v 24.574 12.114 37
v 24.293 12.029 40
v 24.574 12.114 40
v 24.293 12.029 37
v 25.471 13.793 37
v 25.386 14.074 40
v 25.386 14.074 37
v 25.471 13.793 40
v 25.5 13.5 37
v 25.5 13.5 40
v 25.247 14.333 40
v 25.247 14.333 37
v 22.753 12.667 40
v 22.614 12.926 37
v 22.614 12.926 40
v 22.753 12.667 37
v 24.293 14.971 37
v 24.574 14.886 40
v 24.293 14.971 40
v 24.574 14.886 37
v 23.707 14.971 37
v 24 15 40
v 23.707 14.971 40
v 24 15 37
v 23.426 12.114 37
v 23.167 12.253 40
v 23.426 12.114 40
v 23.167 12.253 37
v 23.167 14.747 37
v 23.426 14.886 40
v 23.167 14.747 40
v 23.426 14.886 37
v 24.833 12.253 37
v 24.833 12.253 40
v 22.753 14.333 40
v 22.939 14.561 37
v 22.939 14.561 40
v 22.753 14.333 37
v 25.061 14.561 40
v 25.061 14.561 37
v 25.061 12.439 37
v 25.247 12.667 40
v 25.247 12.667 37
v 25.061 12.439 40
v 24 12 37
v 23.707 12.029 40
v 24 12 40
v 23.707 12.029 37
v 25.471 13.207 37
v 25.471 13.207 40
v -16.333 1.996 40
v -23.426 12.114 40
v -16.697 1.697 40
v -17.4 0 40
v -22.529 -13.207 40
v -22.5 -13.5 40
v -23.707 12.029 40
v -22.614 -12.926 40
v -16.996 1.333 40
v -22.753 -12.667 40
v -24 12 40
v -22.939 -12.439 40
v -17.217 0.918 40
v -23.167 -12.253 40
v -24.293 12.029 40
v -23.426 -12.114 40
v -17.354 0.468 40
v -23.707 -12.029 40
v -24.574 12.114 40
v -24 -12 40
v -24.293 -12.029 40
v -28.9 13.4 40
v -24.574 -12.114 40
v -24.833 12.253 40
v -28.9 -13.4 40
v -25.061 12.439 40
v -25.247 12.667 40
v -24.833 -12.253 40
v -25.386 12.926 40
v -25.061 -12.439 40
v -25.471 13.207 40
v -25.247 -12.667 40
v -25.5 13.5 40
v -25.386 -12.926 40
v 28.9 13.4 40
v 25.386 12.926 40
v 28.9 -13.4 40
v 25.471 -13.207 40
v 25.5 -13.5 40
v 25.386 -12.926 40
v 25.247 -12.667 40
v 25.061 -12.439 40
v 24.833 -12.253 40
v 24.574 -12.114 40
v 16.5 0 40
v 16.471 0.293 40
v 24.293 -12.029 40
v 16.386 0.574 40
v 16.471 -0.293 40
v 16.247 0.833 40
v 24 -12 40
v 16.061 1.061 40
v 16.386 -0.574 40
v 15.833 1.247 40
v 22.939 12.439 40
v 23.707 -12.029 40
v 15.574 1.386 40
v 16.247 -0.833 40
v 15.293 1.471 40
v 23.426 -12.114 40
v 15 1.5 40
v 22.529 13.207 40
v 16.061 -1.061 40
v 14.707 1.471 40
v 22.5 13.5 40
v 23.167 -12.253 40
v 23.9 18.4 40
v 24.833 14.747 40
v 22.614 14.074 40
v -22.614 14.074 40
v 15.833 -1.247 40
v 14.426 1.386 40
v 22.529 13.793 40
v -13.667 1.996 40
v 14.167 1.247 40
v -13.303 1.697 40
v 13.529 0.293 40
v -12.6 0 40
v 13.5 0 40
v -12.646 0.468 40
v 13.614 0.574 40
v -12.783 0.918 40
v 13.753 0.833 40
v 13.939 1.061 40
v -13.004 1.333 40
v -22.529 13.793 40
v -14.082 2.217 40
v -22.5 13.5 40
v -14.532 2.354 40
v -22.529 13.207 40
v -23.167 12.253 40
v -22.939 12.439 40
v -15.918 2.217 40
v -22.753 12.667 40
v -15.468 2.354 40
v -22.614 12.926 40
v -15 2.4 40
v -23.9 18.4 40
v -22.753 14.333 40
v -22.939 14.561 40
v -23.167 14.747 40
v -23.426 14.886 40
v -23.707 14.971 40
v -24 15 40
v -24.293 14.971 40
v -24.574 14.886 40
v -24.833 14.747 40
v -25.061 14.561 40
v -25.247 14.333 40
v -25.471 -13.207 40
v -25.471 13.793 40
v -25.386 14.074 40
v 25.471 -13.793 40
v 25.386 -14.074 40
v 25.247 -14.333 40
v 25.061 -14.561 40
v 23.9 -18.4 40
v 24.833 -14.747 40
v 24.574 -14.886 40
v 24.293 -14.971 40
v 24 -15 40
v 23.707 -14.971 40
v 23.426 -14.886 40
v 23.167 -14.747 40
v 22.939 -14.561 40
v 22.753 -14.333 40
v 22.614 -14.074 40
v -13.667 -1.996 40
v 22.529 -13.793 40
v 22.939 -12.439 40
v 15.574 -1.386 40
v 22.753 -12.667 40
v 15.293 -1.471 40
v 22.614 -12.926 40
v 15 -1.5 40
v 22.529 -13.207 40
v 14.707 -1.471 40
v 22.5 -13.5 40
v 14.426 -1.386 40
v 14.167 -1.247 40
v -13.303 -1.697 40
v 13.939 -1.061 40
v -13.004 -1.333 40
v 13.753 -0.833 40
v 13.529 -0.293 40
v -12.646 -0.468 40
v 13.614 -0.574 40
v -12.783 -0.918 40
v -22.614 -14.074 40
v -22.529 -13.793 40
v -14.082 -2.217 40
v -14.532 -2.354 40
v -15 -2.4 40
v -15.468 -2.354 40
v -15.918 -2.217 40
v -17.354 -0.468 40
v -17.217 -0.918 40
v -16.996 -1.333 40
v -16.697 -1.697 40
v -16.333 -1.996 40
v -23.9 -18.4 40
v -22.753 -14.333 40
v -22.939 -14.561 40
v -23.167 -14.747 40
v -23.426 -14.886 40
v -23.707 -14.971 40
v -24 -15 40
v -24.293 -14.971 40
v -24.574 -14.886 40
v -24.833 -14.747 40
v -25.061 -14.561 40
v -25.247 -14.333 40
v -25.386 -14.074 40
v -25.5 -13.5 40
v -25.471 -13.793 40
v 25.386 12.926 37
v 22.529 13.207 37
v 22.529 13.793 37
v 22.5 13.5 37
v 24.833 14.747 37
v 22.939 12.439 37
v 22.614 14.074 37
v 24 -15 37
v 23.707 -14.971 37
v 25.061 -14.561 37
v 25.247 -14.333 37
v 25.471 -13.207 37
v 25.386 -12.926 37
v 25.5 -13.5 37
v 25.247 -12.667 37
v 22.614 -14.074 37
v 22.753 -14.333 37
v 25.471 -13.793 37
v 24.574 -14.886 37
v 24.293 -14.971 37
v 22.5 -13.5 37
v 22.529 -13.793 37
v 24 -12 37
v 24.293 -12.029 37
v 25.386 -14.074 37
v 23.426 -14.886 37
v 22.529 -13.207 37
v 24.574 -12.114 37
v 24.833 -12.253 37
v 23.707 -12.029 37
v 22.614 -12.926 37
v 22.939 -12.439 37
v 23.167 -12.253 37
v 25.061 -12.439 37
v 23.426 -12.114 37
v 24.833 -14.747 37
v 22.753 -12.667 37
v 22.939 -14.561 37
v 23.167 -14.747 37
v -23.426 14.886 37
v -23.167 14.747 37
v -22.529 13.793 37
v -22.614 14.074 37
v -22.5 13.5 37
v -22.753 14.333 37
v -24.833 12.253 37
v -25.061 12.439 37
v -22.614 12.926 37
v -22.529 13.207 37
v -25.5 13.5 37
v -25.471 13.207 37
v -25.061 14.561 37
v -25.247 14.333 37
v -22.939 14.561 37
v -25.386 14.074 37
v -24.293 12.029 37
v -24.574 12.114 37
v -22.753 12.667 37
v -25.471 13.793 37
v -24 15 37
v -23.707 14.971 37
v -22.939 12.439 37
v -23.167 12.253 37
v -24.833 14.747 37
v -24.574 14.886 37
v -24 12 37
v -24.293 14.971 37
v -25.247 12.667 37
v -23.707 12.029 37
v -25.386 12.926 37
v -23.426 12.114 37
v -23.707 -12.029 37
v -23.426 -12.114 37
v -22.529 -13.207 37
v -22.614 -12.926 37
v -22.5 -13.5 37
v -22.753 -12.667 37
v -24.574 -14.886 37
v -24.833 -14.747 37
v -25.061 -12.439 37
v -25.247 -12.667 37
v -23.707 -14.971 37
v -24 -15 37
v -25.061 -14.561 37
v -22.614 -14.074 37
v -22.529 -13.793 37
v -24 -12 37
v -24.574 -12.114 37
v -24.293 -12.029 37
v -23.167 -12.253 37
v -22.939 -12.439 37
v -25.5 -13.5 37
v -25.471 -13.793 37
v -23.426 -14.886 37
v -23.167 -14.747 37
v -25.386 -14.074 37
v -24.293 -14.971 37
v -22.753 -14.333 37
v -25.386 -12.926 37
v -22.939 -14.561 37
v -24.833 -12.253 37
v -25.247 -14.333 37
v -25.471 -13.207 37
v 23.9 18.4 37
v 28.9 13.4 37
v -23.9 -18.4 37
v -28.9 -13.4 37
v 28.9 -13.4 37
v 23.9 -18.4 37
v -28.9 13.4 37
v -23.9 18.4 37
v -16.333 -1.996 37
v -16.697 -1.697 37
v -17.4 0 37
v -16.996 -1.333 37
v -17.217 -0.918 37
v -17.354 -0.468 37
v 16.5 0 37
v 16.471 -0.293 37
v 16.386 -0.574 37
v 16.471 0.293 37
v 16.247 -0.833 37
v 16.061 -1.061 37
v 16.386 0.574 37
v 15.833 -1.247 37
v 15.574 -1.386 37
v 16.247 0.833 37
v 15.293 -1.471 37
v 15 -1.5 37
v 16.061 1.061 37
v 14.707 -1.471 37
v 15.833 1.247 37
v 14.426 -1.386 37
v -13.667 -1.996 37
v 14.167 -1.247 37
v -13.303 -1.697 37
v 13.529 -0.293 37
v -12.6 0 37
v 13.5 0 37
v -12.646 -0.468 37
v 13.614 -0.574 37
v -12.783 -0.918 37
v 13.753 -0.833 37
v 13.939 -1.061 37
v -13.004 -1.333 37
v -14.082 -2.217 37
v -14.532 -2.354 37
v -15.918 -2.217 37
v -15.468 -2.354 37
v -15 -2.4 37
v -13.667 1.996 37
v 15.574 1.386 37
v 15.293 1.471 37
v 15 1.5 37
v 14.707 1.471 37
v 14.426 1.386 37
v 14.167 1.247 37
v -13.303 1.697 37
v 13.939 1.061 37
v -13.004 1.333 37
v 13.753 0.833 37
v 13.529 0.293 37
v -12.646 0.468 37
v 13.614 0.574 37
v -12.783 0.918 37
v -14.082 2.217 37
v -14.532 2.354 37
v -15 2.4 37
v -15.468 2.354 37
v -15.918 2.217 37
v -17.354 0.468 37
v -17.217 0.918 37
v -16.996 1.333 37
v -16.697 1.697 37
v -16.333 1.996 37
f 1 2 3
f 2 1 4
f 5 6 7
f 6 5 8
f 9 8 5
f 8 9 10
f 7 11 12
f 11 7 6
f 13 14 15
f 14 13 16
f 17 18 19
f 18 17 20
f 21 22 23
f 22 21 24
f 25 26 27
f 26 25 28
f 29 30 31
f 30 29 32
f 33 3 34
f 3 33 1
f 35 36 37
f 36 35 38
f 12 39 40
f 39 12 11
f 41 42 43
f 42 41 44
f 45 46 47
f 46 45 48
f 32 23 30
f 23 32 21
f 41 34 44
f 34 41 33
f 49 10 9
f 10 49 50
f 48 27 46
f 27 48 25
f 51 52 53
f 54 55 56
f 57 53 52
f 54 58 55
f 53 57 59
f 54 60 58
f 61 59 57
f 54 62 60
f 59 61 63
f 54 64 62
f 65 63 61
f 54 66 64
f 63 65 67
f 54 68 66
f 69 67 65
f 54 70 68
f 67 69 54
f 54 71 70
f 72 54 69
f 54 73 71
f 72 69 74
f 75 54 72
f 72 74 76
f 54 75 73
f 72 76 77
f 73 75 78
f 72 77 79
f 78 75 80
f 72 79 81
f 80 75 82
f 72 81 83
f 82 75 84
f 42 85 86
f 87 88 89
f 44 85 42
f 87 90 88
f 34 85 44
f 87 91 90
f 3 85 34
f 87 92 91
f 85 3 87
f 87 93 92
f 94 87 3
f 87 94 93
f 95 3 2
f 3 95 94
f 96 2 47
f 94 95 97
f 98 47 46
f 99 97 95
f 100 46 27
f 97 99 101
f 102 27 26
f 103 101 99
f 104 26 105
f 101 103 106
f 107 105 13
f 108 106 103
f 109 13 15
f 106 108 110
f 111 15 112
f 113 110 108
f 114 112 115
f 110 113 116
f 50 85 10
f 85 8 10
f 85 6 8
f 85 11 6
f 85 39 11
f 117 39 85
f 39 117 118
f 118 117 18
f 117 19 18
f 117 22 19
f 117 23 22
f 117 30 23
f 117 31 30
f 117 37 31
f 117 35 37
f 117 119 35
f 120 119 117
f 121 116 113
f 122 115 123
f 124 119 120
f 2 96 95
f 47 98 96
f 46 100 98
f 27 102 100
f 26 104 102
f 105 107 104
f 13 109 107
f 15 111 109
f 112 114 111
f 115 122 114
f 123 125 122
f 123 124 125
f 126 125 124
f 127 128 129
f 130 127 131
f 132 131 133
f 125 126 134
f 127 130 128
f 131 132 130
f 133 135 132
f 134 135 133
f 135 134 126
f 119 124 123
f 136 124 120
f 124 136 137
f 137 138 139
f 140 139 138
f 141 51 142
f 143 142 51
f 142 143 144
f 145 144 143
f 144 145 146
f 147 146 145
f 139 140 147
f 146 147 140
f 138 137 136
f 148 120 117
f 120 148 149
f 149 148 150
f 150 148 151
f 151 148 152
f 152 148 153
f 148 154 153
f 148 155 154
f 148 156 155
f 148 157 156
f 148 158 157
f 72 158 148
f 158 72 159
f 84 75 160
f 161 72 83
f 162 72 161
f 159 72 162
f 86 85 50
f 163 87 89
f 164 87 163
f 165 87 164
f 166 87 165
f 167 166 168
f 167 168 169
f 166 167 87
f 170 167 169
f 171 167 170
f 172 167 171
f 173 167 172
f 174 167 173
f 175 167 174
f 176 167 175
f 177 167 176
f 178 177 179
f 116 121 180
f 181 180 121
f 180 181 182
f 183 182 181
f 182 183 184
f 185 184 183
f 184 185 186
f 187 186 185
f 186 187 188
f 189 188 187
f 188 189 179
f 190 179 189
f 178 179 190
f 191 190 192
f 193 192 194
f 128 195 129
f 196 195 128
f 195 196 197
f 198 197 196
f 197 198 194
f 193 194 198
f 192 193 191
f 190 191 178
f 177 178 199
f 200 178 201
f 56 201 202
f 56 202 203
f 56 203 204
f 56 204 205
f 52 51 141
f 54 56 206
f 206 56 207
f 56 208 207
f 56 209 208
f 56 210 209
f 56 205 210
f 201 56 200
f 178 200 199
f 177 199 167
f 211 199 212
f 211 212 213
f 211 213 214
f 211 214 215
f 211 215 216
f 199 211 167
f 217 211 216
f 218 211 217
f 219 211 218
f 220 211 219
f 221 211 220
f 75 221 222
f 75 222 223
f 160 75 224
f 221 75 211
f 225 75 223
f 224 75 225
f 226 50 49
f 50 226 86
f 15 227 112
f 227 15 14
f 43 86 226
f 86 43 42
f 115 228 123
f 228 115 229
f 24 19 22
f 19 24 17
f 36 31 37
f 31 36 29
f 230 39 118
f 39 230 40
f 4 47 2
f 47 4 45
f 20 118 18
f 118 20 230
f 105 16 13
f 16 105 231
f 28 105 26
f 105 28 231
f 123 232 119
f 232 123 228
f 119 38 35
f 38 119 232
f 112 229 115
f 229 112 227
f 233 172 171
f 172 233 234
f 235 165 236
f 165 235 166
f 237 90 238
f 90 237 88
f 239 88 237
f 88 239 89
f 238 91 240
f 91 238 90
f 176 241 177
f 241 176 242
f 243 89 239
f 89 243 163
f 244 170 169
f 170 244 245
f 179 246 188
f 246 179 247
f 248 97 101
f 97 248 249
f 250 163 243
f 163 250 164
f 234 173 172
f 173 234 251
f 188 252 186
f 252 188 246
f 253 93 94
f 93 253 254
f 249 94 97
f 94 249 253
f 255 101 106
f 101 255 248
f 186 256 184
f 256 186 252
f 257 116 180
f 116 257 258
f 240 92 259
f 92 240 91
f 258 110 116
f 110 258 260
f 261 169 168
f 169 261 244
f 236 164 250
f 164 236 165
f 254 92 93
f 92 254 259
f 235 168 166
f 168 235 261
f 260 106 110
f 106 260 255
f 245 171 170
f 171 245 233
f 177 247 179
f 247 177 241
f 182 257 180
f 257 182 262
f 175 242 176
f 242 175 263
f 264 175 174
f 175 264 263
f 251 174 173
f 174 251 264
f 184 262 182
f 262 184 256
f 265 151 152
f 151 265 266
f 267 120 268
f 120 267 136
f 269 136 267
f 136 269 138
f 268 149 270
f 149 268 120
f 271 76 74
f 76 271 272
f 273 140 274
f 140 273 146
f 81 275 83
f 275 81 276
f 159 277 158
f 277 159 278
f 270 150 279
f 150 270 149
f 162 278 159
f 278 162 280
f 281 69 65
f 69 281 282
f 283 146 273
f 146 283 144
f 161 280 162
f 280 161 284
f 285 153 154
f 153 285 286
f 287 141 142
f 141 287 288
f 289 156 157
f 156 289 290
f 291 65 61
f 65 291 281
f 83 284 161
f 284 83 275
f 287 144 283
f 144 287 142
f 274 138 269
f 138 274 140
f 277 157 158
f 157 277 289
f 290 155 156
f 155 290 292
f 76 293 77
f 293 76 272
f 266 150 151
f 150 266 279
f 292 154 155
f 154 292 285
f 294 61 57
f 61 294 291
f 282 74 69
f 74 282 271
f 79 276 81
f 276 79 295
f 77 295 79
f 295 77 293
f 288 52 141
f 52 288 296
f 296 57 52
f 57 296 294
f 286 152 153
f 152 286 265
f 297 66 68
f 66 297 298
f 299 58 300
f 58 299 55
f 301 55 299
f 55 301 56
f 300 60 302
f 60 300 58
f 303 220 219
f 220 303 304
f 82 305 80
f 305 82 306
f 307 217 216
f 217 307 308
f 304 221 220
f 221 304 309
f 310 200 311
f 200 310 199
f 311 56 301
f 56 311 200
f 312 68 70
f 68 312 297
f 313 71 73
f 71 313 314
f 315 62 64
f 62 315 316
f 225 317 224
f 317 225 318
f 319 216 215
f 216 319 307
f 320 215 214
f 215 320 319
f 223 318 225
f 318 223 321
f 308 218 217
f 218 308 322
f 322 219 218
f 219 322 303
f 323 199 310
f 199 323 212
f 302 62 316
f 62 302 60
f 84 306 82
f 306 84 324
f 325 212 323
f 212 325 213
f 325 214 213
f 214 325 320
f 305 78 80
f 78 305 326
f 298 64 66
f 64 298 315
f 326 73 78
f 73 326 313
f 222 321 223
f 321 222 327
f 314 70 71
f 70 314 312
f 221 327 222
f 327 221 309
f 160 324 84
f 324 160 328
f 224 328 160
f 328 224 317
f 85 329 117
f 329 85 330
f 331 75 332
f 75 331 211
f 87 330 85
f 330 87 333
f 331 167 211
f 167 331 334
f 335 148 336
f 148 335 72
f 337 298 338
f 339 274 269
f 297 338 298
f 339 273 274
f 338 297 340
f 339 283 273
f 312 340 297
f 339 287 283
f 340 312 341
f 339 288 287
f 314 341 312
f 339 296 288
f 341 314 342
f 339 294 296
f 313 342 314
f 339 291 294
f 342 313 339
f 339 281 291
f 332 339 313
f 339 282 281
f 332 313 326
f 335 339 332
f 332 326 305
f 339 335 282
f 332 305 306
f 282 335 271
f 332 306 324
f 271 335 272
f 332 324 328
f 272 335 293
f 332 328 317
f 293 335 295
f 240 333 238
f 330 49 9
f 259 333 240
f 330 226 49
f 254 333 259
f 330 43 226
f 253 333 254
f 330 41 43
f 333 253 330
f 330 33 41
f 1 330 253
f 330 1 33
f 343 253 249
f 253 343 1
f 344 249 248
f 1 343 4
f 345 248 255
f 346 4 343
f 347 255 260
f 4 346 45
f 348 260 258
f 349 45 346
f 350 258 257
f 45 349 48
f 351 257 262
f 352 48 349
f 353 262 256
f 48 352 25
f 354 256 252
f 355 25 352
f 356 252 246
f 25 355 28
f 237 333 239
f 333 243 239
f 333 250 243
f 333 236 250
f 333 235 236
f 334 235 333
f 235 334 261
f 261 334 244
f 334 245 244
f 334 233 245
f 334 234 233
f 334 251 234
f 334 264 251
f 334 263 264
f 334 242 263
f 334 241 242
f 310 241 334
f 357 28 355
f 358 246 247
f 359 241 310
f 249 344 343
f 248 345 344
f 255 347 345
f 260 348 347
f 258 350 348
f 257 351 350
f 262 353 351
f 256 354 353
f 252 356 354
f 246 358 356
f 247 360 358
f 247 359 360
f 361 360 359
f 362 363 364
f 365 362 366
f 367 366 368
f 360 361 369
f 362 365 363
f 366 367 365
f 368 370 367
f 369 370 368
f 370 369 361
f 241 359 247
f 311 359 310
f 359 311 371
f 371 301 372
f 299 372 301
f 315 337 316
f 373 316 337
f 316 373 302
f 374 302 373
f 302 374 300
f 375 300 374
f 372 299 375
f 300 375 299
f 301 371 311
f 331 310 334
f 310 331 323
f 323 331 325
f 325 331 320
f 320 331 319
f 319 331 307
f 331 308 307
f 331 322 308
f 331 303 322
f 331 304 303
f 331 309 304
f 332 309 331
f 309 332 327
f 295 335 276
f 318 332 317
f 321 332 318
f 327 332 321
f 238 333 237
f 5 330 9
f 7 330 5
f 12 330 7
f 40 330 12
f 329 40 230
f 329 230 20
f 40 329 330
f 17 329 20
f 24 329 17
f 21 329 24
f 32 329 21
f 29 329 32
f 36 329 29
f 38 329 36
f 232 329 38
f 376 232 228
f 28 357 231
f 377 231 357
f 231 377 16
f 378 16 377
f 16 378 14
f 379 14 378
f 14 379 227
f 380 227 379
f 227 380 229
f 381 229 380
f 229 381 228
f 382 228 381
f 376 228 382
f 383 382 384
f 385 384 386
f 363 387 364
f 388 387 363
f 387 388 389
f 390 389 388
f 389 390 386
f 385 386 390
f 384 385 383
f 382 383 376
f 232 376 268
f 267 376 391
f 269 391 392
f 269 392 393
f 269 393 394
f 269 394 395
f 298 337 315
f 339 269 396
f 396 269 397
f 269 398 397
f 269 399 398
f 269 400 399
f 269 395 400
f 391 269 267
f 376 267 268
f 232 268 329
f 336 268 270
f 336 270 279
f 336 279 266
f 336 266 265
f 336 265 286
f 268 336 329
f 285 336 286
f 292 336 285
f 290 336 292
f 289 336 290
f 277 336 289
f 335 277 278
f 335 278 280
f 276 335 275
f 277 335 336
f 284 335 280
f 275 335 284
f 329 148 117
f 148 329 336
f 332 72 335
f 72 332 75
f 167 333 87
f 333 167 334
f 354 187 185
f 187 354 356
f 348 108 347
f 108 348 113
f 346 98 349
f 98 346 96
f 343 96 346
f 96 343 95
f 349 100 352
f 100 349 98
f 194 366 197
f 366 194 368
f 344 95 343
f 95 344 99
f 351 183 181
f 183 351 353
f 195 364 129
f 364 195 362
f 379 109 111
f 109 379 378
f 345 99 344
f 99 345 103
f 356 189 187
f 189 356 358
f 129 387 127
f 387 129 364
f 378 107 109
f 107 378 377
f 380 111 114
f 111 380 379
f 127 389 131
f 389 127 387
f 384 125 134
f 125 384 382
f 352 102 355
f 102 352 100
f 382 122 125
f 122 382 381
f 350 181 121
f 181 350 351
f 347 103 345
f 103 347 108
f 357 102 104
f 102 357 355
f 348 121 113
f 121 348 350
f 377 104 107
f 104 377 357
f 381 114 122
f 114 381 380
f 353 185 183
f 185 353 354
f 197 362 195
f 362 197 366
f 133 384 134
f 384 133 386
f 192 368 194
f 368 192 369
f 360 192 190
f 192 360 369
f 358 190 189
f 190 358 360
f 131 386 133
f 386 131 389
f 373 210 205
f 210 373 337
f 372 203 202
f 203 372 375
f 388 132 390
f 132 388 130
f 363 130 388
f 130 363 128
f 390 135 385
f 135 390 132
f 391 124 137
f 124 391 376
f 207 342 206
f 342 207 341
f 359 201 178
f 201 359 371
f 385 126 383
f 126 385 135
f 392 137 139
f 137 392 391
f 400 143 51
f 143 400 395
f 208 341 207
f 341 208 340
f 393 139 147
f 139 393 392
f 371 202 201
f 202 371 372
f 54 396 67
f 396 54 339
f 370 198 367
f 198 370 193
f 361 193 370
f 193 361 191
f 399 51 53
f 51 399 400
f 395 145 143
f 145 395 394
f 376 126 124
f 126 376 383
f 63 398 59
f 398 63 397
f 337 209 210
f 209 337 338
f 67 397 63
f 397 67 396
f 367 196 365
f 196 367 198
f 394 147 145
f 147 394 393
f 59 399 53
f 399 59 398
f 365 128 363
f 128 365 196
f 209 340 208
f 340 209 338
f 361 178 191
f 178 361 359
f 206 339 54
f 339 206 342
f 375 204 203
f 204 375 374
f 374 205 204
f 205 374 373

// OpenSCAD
enclosure_inner_length = 56;
enclosure_inner_width = 35;
enclosure_inner_depth = 35;

enclosure_thickness = 2;

cover_thickness = 3;

part = "cover"; // [enclosure:Enclosure, cover:Cover, both:Enclosure and Cover]

print_part();

module print_part() {
	if (part == "enclosure") {
		box2(enclosure_inner_length,enclosure_inner_width,enclosure_inner_depth,enclosure_thickness,enclosure_thickness/2-0.10,cover_thickness);
	} else if (part == "cover") {
		lid2(enclosure_inner_length,enclosure_inner_width,enclosure_inner_depth,enclosure_thickness,enclosure_thickness/2+0.10,cover_thickness);
	} else {
		both();
	}
}

module both() {

	box2(enclosure_inner_length,enclosure_inner_width,enclosure_inner_depth,enclosure_thickness,enclosure_thickness/2-0.10,cover_thickness);
	lid2(enclosure_inner_length,enclosure_inner_width,enclosure_inner_depth,enclosure_thickness,enclosure_thickness/2+0.10,cover_thickness);

}

module screws(in_x, in_y, in_z, shell) {

	sx = in_x/2 - 4;
	sy = in_y/2 - 4;
	sh = shell + in_z - 12;
	nh = shell + in_z - 4;

	translate([0,0,0]) {
		translate([sx , sy, sh]) cylinder(r=1.5, h = 15, $fn=32);
		translate([sx , -sy, sh ]) cylinder(r=1.5, h = 15, $fn=32);
		translate([-sx , sy, sh ]) cylinder(r=1.5, h = 15, $fn=32);
		translate([-sx , -sy, sh ]) cylinder(r=1.5, h = 15, $fn=32);
	
	
		translate([-sx , -sy, nh ]) rotate([0,0,-45]) 
			translate([-5.75/2, -5.6/2, -0.7]) cube ([5.75, 10, 2.8]);
		translate([sx , -sy, nh ]) rotate([0,0,45]) 
			translate([-5.75/2, -5.6/2, -0.7]) cube ([5.75, 10, 2.8]);
		translate([sx , sy, nh ]) rotate([0,0,90+45]) 
			translate([-5.75/2, -5.6/2, -0.7]) cube ([5.75, 10, 2.8]);
		translate([-sx , sy, nh ]) rotate([0,0,-90-45]) 
			translate([-5.75/2, -5.6/2, -0.7]) cube ([5.75, 10, 2.8]);
	}
}

module bottom(in_x, in_y, in_z, shell) {

	hull() {
   	 	translate([-in_x/2+shell, -in_y/2+shell, 0]) cylinder(r=shell*2,h=shell, $fn=32);
		translate([+in_x/2-shell, -in_y/2+shell, 0]) cylinder(r=shell*2,h=shell, $fn=32);
		translate([+in_x/2-shell, in_y/2-shell, 0]) cylinder(r=shell*2,h=shell, $fn=32);
		translate([-in_x/2+shell, in_y/2-shell, 0]) cylinder(r=shell*2,h=shell, $fn=32);
	}
}

module sides(in_x, in_y, in_z, shell) {
	translate([0,0,shell])
	difference() {
		hull() {
	   	 	translate([-in_x/2+shell, -in_y/2+shell, 0]) cylinder(r=shell*2,h=in_z, $fn=32);
			translate([+in_x/2-shell, -in_y/2+shell, 0]) cylinder(r=shell*2,h=in_z, $fn=32);
			translate([+in_x/2-shell, in_y/2-shell, 0]) cylinder(r=shell*2,h=in_z, $fn=32);
			translate([-in_x/2+shell, in_y/2-shell, 0]) cylinder(r=shell*2,h=in_z, $fn=32);
		}
	
		hull() {
	   	 	translate([-in_x/2+shell, -in_y/2+shell, 0]) cylinder(r=shell,h=in_z+1, $fn=32);
			translate([+in_x/2-shell, -in_y/2+shell, 0]) cylinder(r=shell,h=in_z+1, $fn=32);
			translate([+in_x/2-shell, in_y/2-shell, 0]) cylinder(r=shell,h=in_z+1, $fn=32);
			translate([-in_x/2+shell, in_y/2-shell, 0]) cylinder(r=shell,h=in_z+1, $fn=32);
		}
	}
	
	intersection() {
		translate([-in_x/2, -in_y/2, shell]) cube([in_x, in_y, in_z+2]);
		union() {
			translate([-in_x/2 , -in_y/2,shell + in_z -6]) cylinder(r=9, h = 6, $fn=64);
			translate([-in_x/2 , -in_y/2,shell + in_z -10]) cylinder(r1=3, r2=9, h = 4, $fn=64);
		
			translate([in_x/2 , -in_y/2, shell + in_z -6]) cylinder(r=9, h = 6, $fn=64);
			translate([in_x/2 , -in_y/2, shell + in_z -10]) cylinder(r1=3, r2=9, h = 4, $fn=64);
		
			translate([in_x/2 , in_y/2,  shell + in_z -6]) cylinder(r=9, h = 6, $fn=64);
			translate([in_x/2 , in_y/2,  shell + in_z -10]) cylinder(r1=3, r2=9, h = 4, $fn=64);
		
			translate([-in_x/2 , in_y/2, shell + in_z -6]) cylinder(r=9, h = 6, $fn=64);
			translate([-in_x/2 , in_y/2, shell + in_z -10]) cylinder(r1=3, r2=9, h = 4, $fn=64);
		}
	}
}

module lid_top_lip2(in_x, in_y, in_z, shell, top_lip, top_thickness) {

	cxm = -in_x/2 - (shell-top_lip);
	cxp = in_x/2 + (shell-top_lip);
	cym = -in_y/2 - (shell-top_lip);
	cyp = in_y/2 + (shell-top_lip);

	translate([0,0,shell+in_z])

	difference() {
	
		hull() {
	   	 	translate([-in_x/2+shell, -in_y/2+shell, 0]) cylinder(r=shell*2,h=top_thickness, $fn=32);
			translate([+in_x/2-shell, -in_y/2+shell, 0]) cylinder(r=shell*2,h=top_thickness, $fn=32);
			translate([+in_x/2-shell, in_y/2-shell, 0]) cylinder(r=shell*2,h=top_thickness, $fn=32);
			translate([-in_x/2+shell, in_y/2-shell, 0]) cylinder(r=shell*2,h=top_thickness, $fn=32);
		}
	
		
		translate([0, 0, -1]) linear_extrude(height = top_thickness + 2) polygon(points = [
			[cxm+5, cym],
			[cxm, cym+5],
			[cxm, cyp-5],
			[cxm+5, cyp],
			[cxp-5, cyp],
			[cxp, cyp-5],
			[cxp, cym+5],
			[cxp-5, cym]]);
	}
}

module lid2(in_x, in_y, in_z, shell, top_lip, top_thickness) {

	cxm = -in_x/2 - (shell-top_lip);
	cxp = in_x/2 + (shell-top_lip);
	cym = -in_y/2 - (shell-top_lip);
	cyp = in_y/2 + (shell-top_lip);	

	difference() {
		translate([0, 0, in_z+shell]) linear_extrude(height = top_thickness ) polygon(points = [
			[cxm+5, cym],
			[cxm, cym+5],
			[cxm, cyp-5],
			[cxm+5, cyp],
			[cxp-5, cyp],
			[cxp, cyp-5],
			[cxp, cym+5],
			[cxp-5, cym]]);
	
			screws(in_x, in_y, in_z, shell);
        hole("lid", 1.5, [15, 0]);
        hole("lid", 2.4, [-15, 0]);
	}
}

module box2(in_x, in_y, in_z, shell, top_lip, top_thickness) {
	bottom(in_x, in_y, in_z, shell);
	difference() {
		sides(in_x, in_y, in_z, shell);
		screws(in_x, in_y, in_z, shell);
		hole("length_1", 7.5, [1, 10]);
		//hole("lid", 40, [40, 0]);
	}
	lid_top_lip2(in_x, in_y, in_z, shell, top_lip, top_thickness);
}

module punch_hole(cylinder, rotate, translate_coords) {
	translate(translate_coords) rotate (rotate) cylinder (h = cylinder[1], r=cylinder[0], center = false, $fn=32);
    
}

module hole(side, radius, offset) {
	// side is "[length/width]_[1/2]"
	// radius is hole radius
	// offset is [horizontal, height] from the [center, bottom] of the side, or from the [center, center] of the lid.

	if (side == "length_1") {
		assign (
			rotate = [90,0,90], 
			translate_coords = [enclosure_thickness+1, offset[0], offset[1]], 
			length = enclosure_inner_length/2) {
				punch_hole([radius, length], rotate, translate_coords);
		}
	}
	if (side == "length_2") {
		assign (
			rotate = [90,0,270], 
			translate_coords = [-(enclosure_thickness+1), offset[0], offset[1]], 
			length = enclosure_inner_length/2) {
				punch_hole([radius, length], rotate, translate_coords);
		}
	}
	if (side == "width_1") {
		assign (
			rotate = [90,0,0], 
			translate_coords = [offset[0], -(enclosure_thickness+1), offset[1]], 
			length = enclosure_inner_width/2) {
				punch_hole([radius, length], rotate, translate_coords);
		}
	}
	if (side == "width_2") {
		assign (
			rotate = [90,0,180], 
			translate_coords = [offset[0], enclosure_thickness+1, offset[1]], 
			length = enclosure_inner_width/2) {
				punch_hole([radius, length], rotate, translate_coords);
		}
	}
	if (side == "lid") {
		assign (
			rotate = [0,0,0], 
			translate_coords = [offset[0], offset[1], enclosure_inner_depth-cover_thickness], 
			length = enclosure_inner_depth/2) {
				punch_hole([radius, length], rotate, translate_coords);
		}
	}
}
